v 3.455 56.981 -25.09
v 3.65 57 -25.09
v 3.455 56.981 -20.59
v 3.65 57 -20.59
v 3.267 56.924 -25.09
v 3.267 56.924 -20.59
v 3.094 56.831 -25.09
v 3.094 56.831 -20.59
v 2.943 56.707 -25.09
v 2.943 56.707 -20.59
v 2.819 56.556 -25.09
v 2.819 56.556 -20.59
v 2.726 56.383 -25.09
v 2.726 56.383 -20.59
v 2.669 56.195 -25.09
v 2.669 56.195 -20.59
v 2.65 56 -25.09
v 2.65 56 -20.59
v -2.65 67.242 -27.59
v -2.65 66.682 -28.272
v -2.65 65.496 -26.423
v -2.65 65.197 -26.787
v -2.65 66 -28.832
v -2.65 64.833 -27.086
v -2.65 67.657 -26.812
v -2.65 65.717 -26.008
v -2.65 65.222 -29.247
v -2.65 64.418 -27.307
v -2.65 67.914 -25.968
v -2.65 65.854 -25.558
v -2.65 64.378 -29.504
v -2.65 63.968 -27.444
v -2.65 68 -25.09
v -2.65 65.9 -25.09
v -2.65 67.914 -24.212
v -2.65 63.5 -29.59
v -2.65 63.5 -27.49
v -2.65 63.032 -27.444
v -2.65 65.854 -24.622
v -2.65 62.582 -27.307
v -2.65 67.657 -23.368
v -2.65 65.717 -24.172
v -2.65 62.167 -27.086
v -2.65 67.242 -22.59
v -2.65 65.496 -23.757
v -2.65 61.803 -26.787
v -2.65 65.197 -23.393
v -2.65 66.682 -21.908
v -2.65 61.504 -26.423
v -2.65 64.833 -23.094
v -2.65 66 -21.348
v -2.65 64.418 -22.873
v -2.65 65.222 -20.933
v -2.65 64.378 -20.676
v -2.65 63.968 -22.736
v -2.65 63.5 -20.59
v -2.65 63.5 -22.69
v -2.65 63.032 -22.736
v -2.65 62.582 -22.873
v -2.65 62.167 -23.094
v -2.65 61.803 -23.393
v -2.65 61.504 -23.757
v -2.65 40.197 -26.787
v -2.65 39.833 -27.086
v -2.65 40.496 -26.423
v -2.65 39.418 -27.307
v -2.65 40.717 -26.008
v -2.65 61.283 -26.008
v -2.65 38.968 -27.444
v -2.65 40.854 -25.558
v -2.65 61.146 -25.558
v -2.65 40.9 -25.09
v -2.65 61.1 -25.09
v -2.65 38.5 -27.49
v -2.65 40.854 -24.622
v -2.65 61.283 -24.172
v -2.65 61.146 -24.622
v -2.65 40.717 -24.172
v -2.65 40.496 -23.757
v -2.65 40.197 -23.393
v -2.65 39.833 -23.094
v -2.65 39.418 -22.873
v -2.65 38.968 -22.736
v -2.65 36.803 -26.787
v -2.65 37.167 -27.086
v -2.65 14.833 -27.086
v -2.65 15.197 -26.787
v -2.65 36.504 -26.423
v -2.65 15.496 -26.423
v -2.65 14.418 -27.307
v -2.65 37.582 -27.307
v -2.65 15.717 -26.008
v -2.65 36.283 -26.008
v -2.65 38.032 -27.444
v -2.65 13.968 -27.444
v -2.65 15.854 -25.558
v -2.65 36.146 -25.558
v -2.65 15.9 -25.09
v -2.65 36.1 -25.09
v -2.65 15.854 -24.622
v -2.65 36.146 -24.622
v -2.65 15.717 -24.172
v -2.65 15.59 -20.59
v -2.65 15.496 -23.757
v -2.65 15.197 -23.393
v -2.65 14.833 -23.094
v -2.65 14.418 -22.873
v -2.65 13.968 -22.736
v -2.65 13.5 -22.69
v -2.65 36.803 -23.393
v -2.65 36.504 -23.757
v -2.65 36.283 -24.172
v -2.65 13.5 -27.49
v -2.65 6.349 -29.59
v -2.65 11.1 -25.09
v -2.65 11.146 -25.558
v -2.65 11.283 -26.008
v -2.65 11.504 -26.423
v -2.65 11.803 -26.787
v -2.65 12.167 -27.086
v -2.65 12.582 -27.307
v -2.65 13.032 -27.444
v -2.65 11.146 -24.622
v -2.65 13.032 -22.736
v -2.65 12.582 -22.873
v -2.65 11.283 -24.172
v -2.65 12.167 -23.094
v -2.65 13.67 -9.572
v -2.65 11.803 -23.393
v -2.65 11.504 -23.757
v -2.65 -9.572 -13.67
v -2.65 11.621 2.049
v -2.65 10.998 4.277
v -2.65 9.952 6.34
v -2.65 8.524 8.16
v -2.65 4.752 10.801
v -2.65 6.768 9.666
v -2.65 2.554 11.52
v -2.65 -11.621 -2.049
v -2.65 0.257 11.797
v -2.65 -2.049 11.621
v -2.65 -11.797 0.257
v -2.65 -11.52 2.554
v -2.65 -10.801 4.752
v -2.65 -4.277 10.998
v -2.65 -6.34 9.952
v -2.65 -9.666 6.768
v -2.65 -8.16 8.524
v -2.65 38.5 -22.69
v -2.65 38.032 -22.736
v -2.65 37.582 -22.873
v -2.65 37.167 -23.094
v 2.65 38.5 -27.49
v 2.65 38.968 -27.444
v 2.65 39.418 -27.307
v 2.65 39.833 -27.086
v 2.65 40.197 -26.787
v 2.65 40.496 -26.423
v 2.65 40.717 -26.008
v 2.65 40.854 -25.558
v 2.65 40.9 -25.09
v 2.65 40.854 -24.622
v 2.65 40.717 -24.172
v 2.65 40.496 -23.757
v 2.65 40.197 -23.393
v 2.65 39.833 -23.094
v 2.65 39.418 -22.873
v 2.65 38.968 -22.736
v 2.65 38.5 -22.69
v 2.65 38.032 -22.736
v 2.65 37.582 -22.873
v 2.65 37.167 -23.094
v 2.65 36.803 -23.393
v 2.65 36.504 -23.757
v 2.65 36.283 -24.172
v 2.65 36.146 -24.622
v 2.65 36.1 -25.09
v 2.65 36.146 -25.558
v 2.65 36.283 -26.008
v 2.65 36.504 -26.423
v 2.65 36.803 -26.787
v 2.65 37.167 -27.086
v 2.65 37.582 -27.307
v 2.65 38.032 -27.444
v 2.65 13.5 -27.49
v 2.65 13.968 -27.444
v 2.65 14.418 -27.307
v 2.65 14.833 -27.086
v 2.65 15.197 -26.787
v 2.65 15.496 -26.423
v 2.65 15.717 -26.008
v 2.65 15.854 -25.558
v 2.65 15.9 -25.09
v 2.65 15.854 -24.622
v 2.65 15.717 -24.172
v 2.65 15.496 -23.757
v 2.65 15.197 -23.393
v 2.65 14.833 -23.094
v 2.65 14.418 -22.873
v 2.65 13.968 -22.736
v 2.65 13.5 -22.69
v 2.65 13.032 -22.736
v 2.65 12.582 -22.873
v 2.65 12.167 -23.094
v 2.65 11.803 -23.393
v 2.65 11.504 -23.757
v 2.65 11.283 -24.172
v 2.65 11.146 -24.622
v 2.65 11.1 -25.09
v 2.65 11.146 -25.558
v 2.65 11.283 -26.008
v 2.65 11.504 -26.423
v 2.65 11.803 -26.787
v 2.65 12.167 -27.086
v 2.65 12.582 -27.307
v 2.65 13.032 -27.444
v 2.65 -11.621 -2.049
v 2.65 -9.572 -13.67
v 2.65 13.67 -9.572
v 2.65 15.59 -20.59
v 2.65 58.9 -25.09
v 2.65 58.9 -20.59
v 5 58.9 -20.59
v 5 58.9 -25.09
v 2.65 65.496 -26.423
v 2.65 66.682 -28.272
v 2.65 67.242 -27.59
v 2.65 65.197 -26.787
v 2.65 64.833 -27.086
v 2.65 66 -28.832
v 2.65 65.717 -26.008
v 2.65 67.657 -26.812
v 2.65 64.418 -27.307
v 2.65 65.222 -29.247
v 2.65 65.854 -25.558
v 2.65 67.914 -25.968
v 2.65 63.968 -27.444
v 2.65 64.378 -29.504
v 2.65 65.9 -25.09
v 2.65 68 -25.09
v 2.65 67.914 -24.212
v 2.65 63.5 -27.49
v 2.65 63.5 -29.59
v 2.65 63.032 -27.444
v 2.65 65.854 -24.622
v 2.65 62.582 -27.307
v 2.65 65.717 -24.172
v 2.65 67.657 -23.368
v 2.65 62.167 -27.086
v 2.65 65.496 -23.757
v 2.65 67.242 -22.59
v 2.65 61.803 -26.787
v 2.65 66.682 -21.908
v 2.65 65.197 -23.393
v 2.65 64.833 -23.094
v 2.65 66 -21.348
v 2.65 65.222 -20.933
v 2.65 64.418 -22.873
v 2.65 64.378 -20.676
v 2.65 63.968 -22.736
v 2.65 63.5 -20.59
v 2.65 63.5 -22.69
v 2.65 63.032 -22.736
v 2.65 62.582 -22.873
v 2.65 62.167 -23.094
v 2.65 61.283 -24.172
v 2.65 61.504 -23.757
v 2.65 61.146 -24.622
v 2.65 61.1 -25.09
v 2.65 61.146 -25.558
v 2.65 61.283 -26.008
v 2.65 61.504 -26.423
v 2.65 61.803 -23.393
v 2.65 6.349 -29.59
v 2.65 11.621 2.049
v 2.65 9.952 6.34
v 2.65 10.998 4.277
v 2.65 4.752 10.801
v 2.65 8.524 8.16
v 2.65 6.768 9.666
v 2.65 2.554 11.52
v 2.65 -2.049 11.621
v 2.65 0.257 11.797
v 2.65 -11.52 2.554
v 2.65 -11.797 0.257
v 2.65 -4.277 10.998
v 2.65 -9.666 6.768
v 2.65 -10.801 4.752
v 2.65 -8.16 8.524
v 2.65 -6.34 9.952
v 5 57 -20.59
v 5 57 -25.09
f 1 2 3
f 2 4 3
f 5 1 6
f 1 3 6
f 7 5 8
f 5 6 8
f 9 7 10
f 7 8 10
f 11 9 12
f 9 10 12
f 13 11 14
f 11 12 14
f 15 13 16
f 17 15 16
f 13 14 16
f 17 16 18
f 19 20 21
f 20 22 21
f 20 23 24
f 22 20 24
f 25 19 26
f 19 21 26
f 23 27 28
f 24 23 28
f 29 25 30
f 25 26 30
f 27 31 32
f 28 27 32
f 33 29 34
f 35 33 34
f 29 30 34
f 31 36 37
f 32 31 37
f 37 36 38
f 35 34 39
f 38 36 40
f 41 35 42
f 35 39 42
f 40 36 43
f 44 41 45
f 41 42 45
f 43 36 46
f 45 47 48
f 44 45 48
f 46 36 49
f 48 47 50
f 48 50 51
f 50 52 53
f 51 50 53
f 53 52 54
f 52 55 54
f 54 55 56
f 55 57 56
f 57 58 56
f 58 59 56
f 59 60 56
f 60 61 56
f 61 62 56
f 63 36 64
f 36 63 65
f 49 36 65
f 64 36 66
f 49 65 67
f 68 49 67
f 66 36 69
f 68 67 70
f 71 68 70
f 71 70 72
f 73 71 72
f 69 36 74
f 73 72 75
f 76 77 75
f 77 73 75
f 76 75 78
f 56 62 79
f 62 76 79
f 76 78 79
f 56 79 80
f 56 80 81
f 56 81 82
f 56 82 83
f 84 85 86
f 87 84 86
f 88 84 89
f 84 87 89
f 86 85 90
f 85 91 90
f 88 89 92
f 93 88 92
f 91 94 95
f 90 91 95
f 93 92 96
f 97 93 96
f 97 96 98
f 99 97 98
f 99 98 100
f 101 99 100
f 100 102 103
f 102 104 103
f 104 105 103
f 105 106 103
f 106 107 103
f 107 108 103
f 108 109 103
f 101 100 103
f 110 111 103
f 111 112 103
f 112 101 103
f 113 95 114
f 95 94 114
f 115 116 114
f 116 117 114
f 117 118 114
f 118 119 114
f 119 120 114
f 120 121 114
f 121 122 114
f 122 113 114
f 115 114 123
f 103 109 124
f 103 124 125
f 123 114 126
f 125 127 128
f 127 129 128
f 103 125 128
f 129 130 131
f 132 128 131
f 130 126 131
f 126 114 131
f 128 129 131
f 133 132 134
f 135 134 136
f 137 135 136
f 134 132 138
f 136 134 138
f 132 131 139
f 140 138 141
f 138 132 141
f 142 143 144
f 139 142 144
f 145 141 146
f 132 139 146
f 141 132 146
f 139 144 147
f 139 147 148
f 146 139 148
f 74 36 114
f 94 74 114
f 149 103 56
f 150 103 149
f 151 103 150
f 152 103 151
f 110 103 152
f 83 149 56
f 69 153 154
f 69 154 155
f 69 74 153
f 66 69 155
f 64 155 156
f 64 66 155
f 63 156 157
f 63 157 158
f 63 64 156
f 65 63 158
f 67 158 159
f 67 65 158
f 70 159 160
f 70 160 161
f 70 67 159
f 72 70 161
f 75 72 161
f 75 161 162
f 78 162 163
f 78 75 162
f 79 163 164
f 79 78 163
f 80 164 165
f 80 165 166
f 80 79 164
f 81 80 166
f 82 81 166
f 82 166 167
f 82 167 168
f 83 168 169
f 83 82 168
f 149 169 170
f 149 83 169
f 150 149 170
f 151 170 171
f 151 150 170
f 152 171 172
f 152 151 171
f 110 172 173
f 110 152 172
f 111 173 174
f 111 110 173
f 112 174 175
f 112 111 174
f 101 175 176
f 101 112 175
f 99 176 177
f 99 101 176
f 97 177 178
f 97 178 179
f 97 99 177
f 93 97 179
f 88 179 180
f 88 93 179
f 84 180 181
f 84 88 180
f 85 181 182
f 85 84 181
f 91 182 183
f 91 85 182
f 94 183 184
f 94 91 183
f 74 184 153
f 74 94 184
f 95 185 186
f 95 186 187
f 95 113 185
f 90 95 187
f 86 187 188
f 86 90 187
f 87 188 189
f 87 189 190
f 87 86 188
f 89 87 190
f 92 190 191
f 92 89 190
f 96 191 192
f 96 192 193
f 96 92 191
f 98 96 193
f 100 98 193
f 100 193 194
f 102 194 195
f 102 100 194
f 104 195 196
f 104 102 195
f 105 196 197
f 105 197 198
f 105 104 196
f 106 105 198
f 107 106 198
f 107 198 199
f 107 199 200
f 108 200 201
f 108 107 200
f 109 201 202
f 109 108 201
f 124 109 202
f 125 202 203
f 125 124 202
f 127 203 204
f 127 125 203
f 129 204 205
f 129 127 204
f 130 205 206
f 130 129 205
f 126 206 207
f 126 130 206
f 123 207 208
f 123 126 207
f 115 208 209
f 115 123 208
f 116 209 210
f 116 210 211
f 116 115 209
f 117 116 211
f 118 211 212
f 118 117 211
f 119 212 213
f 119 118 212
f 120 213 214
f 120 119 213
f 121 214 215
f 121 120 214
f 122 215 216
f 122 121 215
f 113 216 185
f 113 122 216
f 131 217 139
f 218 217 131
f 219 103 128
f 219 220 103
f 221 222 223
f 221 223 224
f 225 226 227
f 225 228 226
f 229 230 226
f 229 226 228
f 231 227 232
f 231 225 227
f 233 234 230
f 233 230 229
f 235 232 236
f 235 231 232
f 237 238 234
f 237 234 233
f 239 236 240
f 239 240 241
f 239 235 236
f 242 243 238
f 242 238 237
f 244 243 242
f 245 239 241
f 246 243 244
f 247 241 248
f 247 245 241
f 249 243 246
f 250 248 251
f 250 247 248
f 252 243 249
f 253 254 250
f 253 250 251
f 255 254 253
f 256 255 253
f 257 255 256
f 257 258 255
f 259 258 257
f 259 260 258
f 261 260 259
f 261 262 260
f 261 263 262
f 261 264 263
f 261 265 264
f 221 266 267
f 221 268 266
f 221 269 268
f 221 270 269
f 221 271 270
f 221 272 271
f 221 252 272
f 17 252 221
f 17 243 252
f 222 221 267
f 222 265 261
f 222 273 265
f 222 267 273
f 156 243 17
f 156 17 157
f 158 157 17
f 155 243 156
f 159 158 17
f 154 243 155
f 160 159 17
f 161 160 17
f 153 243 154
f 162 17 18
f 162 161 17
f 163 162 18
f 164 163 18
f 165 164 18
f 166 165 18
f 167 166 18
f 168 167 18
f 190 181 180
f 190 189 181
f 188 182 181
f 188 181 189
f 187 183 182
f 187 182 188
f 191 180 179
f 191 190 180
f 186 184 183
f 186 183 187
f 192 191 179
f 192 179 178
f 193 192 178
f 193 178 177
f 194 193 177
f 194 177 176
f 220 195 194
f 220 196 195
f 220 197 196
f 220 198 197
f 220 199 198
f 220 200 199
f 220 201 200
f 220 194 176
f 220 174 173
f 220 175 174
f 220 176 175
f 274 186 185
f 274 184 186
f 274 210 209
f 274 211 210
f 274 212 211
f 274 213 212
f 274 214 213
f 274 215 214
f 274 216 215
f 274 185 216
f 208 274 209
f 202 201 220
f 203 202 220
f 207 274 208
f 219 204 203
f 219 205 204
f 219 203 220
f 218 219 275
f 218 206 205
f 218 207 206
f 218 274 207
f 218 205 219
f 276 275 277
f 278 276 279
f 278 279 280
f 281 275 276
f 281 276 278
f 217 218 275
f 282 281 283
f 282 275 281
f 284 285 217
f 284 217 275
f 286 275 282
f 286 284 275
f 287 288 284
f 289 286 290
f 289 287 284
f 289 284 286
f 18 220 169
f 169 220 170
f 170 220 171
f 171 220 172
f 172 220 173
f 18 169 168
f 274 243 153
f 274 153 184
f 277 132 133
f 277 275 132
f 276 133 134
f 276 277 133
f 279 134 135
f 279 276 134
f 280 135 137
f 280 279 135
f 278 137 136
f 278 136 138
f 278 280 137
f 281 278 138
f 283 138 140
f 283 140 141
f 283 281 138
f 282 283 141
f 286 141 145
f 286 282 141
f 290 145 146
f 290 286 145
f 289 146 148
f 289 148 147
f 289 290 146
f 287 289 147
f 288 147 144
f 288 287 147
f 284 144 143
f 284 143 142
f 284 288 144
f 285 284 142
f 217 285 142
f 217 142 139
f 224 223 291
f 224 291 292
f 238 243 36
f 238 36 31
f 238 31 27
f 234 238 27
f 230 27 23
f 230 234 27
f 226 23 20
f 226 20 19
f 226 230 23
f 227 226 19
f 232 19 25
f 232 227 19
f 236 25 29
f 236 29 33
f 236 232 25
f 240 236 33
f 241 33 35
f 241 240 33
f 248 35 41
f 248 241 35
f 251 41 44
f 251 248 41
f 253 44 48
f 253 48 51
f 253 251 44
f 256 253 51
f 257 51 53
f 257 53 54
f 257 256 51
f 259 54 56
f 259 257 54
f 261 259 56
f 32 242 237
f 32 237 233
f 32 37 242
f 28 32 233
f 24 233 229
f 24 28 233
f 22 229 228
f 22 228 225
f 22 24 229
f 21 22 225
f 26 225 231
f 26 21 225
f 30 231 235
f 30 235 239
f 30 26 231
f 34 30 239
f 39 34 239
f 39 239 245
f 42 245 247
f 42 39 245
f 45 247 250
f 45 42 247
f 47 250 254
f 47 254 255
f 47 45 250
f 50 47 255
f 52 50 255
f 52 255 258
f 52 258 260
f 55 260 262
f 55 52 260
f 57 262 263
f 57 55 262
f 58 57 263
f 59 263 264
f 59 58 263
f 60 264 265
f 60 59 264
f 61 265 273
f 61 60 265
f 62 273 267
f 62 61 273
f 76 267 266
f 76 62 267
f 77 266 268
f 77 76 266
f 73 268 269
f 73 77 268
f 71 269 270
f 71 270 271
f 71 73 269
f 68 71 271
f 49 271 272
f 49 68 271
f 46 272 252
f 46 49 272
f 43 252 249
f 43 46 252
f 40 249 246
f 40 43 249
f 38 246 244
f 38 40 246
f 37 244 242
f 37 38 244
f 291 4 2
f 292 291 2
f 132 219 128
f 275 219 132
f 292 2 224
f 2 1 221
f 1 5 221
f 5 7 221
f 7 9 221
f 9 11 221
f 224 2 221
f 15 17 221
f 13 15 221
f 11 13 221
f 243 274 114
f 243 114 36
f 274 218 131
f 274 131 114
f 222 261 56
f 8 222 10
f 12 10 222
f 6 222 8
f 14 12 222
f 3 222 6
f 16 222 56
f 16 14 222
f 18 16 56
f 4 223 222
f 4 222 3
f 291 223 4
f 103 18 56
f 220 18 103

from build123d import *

# Parameters (mm, degrees)
SKETCH1_R           = 2.5
BOSS_EXTRUDE1_DEPTH = 2.65
SKETCH1_5_W         = 4.5
SKETCH1_5_H         = 2
BOSS_EXTRUDE2_DEPTH = 5
FILLET1_R           = 1
MOVE_FACE1_BY       = 0.1
MOVE_FACE1_2_BY     = 0.1
MOVE_FACE1_3_BY     = 0.1
MOVE_FACE2_BY       = 0.1


with BuildPart() as part:
    # Sketch1 → Boss-Extrude1 (new, symmetric)
    with BuildSketch(Plane(origin=(0, 0, 0), x_dir=(0, 0, -1), z_dir=(1, 0, 0))):
        with BuildLine():
            Line((2.049048496, -11.620731486), (13.669779982, -9.571682989))
            Line((13.669779982, -9.571682989), (29.59, 6.348537029))
            Line((29.59, 6.348537029), (29.59, 63.5))
            ThreePointArc((29.59, 63.5), (25.09, 68), (20.59, 63.5))
            Line((20.59, 63.5), (20.59, 15.59029712))
            Line((20.59, 15.59029712), (9.571682989, 13.669779982))
            Line((9.571682989, 13.669779982), (-2.049048496, 11.620731486))
            ThreePointArc((-2.049048496, 11.620731486), (-11.620731486, -2.049048496), (2.049048496, -11.620731486))
        make_face()
        with Locations((25.09, 63.5)):
            Circle(SKETCH1_R, mode=Mode.SUBTRACT)
        with Locations((25.09, 13.5)):
            Circle(SKETCH1_R, mode=Mode.SUBTRACT)
        with Locations((25.09, 38.5)):
            Circle(SKETCH1_R, mode=Mode.SUBTRACT)
    extrude(amount=BOSS_EXTRUDE1_DEPTH, both=True)

    # Sketch1<5> → Boss-Extrude2 (add)
    with BuildSketch(Plane(origin=(0, 0, 0), x_dir=(0, 0, -1), z_dir=(1, 0, 0))):
        with Locations((22.84, 58)):
            Rectangle(SKETCH1_5_W, SKETCH1_5_H)
    extrude(amount=BOSS_EXTRUDE2_DEPTH)

    # Fillet1
    fillet1_edges = [part.edges().sort_by_distance(p)[0] for p in [
        (2.65, 57, -22.84),
    ]]
    fillet(fillet1_edges, radius=FILLET1_R)

    # Move Face1: a curved face moved outward by 0.1
    add(Solid.thicken(part.faces().sort_by_distance((0, 13.5, -22.59))[0], MOVE_FACE1_BY))

    # Move Face1 2: a curved face moved outward by 0.1
    add(Solid.thicken(part.faces().sort_by_distance((0, 38.5, -22.59))[0], MOVE_FACE1_2_BY))

    # Move Face1 3: a curved face moved outward by 0.1
    add(Solid.thicken(part.faces().sort_by_distance((0, 63.5, -22.59))[0], MOVE_FACE1_3_BY))

    # Move Face2: a face moved inward by 0.1
    extrude(part.faces().sort_by_distance((3.825, 59, -22.84))[0], amount=MOVE_FACE2_BY, dir=(0, -1, 0), mode=Mode.SUBTRACT)


solid = part.part
